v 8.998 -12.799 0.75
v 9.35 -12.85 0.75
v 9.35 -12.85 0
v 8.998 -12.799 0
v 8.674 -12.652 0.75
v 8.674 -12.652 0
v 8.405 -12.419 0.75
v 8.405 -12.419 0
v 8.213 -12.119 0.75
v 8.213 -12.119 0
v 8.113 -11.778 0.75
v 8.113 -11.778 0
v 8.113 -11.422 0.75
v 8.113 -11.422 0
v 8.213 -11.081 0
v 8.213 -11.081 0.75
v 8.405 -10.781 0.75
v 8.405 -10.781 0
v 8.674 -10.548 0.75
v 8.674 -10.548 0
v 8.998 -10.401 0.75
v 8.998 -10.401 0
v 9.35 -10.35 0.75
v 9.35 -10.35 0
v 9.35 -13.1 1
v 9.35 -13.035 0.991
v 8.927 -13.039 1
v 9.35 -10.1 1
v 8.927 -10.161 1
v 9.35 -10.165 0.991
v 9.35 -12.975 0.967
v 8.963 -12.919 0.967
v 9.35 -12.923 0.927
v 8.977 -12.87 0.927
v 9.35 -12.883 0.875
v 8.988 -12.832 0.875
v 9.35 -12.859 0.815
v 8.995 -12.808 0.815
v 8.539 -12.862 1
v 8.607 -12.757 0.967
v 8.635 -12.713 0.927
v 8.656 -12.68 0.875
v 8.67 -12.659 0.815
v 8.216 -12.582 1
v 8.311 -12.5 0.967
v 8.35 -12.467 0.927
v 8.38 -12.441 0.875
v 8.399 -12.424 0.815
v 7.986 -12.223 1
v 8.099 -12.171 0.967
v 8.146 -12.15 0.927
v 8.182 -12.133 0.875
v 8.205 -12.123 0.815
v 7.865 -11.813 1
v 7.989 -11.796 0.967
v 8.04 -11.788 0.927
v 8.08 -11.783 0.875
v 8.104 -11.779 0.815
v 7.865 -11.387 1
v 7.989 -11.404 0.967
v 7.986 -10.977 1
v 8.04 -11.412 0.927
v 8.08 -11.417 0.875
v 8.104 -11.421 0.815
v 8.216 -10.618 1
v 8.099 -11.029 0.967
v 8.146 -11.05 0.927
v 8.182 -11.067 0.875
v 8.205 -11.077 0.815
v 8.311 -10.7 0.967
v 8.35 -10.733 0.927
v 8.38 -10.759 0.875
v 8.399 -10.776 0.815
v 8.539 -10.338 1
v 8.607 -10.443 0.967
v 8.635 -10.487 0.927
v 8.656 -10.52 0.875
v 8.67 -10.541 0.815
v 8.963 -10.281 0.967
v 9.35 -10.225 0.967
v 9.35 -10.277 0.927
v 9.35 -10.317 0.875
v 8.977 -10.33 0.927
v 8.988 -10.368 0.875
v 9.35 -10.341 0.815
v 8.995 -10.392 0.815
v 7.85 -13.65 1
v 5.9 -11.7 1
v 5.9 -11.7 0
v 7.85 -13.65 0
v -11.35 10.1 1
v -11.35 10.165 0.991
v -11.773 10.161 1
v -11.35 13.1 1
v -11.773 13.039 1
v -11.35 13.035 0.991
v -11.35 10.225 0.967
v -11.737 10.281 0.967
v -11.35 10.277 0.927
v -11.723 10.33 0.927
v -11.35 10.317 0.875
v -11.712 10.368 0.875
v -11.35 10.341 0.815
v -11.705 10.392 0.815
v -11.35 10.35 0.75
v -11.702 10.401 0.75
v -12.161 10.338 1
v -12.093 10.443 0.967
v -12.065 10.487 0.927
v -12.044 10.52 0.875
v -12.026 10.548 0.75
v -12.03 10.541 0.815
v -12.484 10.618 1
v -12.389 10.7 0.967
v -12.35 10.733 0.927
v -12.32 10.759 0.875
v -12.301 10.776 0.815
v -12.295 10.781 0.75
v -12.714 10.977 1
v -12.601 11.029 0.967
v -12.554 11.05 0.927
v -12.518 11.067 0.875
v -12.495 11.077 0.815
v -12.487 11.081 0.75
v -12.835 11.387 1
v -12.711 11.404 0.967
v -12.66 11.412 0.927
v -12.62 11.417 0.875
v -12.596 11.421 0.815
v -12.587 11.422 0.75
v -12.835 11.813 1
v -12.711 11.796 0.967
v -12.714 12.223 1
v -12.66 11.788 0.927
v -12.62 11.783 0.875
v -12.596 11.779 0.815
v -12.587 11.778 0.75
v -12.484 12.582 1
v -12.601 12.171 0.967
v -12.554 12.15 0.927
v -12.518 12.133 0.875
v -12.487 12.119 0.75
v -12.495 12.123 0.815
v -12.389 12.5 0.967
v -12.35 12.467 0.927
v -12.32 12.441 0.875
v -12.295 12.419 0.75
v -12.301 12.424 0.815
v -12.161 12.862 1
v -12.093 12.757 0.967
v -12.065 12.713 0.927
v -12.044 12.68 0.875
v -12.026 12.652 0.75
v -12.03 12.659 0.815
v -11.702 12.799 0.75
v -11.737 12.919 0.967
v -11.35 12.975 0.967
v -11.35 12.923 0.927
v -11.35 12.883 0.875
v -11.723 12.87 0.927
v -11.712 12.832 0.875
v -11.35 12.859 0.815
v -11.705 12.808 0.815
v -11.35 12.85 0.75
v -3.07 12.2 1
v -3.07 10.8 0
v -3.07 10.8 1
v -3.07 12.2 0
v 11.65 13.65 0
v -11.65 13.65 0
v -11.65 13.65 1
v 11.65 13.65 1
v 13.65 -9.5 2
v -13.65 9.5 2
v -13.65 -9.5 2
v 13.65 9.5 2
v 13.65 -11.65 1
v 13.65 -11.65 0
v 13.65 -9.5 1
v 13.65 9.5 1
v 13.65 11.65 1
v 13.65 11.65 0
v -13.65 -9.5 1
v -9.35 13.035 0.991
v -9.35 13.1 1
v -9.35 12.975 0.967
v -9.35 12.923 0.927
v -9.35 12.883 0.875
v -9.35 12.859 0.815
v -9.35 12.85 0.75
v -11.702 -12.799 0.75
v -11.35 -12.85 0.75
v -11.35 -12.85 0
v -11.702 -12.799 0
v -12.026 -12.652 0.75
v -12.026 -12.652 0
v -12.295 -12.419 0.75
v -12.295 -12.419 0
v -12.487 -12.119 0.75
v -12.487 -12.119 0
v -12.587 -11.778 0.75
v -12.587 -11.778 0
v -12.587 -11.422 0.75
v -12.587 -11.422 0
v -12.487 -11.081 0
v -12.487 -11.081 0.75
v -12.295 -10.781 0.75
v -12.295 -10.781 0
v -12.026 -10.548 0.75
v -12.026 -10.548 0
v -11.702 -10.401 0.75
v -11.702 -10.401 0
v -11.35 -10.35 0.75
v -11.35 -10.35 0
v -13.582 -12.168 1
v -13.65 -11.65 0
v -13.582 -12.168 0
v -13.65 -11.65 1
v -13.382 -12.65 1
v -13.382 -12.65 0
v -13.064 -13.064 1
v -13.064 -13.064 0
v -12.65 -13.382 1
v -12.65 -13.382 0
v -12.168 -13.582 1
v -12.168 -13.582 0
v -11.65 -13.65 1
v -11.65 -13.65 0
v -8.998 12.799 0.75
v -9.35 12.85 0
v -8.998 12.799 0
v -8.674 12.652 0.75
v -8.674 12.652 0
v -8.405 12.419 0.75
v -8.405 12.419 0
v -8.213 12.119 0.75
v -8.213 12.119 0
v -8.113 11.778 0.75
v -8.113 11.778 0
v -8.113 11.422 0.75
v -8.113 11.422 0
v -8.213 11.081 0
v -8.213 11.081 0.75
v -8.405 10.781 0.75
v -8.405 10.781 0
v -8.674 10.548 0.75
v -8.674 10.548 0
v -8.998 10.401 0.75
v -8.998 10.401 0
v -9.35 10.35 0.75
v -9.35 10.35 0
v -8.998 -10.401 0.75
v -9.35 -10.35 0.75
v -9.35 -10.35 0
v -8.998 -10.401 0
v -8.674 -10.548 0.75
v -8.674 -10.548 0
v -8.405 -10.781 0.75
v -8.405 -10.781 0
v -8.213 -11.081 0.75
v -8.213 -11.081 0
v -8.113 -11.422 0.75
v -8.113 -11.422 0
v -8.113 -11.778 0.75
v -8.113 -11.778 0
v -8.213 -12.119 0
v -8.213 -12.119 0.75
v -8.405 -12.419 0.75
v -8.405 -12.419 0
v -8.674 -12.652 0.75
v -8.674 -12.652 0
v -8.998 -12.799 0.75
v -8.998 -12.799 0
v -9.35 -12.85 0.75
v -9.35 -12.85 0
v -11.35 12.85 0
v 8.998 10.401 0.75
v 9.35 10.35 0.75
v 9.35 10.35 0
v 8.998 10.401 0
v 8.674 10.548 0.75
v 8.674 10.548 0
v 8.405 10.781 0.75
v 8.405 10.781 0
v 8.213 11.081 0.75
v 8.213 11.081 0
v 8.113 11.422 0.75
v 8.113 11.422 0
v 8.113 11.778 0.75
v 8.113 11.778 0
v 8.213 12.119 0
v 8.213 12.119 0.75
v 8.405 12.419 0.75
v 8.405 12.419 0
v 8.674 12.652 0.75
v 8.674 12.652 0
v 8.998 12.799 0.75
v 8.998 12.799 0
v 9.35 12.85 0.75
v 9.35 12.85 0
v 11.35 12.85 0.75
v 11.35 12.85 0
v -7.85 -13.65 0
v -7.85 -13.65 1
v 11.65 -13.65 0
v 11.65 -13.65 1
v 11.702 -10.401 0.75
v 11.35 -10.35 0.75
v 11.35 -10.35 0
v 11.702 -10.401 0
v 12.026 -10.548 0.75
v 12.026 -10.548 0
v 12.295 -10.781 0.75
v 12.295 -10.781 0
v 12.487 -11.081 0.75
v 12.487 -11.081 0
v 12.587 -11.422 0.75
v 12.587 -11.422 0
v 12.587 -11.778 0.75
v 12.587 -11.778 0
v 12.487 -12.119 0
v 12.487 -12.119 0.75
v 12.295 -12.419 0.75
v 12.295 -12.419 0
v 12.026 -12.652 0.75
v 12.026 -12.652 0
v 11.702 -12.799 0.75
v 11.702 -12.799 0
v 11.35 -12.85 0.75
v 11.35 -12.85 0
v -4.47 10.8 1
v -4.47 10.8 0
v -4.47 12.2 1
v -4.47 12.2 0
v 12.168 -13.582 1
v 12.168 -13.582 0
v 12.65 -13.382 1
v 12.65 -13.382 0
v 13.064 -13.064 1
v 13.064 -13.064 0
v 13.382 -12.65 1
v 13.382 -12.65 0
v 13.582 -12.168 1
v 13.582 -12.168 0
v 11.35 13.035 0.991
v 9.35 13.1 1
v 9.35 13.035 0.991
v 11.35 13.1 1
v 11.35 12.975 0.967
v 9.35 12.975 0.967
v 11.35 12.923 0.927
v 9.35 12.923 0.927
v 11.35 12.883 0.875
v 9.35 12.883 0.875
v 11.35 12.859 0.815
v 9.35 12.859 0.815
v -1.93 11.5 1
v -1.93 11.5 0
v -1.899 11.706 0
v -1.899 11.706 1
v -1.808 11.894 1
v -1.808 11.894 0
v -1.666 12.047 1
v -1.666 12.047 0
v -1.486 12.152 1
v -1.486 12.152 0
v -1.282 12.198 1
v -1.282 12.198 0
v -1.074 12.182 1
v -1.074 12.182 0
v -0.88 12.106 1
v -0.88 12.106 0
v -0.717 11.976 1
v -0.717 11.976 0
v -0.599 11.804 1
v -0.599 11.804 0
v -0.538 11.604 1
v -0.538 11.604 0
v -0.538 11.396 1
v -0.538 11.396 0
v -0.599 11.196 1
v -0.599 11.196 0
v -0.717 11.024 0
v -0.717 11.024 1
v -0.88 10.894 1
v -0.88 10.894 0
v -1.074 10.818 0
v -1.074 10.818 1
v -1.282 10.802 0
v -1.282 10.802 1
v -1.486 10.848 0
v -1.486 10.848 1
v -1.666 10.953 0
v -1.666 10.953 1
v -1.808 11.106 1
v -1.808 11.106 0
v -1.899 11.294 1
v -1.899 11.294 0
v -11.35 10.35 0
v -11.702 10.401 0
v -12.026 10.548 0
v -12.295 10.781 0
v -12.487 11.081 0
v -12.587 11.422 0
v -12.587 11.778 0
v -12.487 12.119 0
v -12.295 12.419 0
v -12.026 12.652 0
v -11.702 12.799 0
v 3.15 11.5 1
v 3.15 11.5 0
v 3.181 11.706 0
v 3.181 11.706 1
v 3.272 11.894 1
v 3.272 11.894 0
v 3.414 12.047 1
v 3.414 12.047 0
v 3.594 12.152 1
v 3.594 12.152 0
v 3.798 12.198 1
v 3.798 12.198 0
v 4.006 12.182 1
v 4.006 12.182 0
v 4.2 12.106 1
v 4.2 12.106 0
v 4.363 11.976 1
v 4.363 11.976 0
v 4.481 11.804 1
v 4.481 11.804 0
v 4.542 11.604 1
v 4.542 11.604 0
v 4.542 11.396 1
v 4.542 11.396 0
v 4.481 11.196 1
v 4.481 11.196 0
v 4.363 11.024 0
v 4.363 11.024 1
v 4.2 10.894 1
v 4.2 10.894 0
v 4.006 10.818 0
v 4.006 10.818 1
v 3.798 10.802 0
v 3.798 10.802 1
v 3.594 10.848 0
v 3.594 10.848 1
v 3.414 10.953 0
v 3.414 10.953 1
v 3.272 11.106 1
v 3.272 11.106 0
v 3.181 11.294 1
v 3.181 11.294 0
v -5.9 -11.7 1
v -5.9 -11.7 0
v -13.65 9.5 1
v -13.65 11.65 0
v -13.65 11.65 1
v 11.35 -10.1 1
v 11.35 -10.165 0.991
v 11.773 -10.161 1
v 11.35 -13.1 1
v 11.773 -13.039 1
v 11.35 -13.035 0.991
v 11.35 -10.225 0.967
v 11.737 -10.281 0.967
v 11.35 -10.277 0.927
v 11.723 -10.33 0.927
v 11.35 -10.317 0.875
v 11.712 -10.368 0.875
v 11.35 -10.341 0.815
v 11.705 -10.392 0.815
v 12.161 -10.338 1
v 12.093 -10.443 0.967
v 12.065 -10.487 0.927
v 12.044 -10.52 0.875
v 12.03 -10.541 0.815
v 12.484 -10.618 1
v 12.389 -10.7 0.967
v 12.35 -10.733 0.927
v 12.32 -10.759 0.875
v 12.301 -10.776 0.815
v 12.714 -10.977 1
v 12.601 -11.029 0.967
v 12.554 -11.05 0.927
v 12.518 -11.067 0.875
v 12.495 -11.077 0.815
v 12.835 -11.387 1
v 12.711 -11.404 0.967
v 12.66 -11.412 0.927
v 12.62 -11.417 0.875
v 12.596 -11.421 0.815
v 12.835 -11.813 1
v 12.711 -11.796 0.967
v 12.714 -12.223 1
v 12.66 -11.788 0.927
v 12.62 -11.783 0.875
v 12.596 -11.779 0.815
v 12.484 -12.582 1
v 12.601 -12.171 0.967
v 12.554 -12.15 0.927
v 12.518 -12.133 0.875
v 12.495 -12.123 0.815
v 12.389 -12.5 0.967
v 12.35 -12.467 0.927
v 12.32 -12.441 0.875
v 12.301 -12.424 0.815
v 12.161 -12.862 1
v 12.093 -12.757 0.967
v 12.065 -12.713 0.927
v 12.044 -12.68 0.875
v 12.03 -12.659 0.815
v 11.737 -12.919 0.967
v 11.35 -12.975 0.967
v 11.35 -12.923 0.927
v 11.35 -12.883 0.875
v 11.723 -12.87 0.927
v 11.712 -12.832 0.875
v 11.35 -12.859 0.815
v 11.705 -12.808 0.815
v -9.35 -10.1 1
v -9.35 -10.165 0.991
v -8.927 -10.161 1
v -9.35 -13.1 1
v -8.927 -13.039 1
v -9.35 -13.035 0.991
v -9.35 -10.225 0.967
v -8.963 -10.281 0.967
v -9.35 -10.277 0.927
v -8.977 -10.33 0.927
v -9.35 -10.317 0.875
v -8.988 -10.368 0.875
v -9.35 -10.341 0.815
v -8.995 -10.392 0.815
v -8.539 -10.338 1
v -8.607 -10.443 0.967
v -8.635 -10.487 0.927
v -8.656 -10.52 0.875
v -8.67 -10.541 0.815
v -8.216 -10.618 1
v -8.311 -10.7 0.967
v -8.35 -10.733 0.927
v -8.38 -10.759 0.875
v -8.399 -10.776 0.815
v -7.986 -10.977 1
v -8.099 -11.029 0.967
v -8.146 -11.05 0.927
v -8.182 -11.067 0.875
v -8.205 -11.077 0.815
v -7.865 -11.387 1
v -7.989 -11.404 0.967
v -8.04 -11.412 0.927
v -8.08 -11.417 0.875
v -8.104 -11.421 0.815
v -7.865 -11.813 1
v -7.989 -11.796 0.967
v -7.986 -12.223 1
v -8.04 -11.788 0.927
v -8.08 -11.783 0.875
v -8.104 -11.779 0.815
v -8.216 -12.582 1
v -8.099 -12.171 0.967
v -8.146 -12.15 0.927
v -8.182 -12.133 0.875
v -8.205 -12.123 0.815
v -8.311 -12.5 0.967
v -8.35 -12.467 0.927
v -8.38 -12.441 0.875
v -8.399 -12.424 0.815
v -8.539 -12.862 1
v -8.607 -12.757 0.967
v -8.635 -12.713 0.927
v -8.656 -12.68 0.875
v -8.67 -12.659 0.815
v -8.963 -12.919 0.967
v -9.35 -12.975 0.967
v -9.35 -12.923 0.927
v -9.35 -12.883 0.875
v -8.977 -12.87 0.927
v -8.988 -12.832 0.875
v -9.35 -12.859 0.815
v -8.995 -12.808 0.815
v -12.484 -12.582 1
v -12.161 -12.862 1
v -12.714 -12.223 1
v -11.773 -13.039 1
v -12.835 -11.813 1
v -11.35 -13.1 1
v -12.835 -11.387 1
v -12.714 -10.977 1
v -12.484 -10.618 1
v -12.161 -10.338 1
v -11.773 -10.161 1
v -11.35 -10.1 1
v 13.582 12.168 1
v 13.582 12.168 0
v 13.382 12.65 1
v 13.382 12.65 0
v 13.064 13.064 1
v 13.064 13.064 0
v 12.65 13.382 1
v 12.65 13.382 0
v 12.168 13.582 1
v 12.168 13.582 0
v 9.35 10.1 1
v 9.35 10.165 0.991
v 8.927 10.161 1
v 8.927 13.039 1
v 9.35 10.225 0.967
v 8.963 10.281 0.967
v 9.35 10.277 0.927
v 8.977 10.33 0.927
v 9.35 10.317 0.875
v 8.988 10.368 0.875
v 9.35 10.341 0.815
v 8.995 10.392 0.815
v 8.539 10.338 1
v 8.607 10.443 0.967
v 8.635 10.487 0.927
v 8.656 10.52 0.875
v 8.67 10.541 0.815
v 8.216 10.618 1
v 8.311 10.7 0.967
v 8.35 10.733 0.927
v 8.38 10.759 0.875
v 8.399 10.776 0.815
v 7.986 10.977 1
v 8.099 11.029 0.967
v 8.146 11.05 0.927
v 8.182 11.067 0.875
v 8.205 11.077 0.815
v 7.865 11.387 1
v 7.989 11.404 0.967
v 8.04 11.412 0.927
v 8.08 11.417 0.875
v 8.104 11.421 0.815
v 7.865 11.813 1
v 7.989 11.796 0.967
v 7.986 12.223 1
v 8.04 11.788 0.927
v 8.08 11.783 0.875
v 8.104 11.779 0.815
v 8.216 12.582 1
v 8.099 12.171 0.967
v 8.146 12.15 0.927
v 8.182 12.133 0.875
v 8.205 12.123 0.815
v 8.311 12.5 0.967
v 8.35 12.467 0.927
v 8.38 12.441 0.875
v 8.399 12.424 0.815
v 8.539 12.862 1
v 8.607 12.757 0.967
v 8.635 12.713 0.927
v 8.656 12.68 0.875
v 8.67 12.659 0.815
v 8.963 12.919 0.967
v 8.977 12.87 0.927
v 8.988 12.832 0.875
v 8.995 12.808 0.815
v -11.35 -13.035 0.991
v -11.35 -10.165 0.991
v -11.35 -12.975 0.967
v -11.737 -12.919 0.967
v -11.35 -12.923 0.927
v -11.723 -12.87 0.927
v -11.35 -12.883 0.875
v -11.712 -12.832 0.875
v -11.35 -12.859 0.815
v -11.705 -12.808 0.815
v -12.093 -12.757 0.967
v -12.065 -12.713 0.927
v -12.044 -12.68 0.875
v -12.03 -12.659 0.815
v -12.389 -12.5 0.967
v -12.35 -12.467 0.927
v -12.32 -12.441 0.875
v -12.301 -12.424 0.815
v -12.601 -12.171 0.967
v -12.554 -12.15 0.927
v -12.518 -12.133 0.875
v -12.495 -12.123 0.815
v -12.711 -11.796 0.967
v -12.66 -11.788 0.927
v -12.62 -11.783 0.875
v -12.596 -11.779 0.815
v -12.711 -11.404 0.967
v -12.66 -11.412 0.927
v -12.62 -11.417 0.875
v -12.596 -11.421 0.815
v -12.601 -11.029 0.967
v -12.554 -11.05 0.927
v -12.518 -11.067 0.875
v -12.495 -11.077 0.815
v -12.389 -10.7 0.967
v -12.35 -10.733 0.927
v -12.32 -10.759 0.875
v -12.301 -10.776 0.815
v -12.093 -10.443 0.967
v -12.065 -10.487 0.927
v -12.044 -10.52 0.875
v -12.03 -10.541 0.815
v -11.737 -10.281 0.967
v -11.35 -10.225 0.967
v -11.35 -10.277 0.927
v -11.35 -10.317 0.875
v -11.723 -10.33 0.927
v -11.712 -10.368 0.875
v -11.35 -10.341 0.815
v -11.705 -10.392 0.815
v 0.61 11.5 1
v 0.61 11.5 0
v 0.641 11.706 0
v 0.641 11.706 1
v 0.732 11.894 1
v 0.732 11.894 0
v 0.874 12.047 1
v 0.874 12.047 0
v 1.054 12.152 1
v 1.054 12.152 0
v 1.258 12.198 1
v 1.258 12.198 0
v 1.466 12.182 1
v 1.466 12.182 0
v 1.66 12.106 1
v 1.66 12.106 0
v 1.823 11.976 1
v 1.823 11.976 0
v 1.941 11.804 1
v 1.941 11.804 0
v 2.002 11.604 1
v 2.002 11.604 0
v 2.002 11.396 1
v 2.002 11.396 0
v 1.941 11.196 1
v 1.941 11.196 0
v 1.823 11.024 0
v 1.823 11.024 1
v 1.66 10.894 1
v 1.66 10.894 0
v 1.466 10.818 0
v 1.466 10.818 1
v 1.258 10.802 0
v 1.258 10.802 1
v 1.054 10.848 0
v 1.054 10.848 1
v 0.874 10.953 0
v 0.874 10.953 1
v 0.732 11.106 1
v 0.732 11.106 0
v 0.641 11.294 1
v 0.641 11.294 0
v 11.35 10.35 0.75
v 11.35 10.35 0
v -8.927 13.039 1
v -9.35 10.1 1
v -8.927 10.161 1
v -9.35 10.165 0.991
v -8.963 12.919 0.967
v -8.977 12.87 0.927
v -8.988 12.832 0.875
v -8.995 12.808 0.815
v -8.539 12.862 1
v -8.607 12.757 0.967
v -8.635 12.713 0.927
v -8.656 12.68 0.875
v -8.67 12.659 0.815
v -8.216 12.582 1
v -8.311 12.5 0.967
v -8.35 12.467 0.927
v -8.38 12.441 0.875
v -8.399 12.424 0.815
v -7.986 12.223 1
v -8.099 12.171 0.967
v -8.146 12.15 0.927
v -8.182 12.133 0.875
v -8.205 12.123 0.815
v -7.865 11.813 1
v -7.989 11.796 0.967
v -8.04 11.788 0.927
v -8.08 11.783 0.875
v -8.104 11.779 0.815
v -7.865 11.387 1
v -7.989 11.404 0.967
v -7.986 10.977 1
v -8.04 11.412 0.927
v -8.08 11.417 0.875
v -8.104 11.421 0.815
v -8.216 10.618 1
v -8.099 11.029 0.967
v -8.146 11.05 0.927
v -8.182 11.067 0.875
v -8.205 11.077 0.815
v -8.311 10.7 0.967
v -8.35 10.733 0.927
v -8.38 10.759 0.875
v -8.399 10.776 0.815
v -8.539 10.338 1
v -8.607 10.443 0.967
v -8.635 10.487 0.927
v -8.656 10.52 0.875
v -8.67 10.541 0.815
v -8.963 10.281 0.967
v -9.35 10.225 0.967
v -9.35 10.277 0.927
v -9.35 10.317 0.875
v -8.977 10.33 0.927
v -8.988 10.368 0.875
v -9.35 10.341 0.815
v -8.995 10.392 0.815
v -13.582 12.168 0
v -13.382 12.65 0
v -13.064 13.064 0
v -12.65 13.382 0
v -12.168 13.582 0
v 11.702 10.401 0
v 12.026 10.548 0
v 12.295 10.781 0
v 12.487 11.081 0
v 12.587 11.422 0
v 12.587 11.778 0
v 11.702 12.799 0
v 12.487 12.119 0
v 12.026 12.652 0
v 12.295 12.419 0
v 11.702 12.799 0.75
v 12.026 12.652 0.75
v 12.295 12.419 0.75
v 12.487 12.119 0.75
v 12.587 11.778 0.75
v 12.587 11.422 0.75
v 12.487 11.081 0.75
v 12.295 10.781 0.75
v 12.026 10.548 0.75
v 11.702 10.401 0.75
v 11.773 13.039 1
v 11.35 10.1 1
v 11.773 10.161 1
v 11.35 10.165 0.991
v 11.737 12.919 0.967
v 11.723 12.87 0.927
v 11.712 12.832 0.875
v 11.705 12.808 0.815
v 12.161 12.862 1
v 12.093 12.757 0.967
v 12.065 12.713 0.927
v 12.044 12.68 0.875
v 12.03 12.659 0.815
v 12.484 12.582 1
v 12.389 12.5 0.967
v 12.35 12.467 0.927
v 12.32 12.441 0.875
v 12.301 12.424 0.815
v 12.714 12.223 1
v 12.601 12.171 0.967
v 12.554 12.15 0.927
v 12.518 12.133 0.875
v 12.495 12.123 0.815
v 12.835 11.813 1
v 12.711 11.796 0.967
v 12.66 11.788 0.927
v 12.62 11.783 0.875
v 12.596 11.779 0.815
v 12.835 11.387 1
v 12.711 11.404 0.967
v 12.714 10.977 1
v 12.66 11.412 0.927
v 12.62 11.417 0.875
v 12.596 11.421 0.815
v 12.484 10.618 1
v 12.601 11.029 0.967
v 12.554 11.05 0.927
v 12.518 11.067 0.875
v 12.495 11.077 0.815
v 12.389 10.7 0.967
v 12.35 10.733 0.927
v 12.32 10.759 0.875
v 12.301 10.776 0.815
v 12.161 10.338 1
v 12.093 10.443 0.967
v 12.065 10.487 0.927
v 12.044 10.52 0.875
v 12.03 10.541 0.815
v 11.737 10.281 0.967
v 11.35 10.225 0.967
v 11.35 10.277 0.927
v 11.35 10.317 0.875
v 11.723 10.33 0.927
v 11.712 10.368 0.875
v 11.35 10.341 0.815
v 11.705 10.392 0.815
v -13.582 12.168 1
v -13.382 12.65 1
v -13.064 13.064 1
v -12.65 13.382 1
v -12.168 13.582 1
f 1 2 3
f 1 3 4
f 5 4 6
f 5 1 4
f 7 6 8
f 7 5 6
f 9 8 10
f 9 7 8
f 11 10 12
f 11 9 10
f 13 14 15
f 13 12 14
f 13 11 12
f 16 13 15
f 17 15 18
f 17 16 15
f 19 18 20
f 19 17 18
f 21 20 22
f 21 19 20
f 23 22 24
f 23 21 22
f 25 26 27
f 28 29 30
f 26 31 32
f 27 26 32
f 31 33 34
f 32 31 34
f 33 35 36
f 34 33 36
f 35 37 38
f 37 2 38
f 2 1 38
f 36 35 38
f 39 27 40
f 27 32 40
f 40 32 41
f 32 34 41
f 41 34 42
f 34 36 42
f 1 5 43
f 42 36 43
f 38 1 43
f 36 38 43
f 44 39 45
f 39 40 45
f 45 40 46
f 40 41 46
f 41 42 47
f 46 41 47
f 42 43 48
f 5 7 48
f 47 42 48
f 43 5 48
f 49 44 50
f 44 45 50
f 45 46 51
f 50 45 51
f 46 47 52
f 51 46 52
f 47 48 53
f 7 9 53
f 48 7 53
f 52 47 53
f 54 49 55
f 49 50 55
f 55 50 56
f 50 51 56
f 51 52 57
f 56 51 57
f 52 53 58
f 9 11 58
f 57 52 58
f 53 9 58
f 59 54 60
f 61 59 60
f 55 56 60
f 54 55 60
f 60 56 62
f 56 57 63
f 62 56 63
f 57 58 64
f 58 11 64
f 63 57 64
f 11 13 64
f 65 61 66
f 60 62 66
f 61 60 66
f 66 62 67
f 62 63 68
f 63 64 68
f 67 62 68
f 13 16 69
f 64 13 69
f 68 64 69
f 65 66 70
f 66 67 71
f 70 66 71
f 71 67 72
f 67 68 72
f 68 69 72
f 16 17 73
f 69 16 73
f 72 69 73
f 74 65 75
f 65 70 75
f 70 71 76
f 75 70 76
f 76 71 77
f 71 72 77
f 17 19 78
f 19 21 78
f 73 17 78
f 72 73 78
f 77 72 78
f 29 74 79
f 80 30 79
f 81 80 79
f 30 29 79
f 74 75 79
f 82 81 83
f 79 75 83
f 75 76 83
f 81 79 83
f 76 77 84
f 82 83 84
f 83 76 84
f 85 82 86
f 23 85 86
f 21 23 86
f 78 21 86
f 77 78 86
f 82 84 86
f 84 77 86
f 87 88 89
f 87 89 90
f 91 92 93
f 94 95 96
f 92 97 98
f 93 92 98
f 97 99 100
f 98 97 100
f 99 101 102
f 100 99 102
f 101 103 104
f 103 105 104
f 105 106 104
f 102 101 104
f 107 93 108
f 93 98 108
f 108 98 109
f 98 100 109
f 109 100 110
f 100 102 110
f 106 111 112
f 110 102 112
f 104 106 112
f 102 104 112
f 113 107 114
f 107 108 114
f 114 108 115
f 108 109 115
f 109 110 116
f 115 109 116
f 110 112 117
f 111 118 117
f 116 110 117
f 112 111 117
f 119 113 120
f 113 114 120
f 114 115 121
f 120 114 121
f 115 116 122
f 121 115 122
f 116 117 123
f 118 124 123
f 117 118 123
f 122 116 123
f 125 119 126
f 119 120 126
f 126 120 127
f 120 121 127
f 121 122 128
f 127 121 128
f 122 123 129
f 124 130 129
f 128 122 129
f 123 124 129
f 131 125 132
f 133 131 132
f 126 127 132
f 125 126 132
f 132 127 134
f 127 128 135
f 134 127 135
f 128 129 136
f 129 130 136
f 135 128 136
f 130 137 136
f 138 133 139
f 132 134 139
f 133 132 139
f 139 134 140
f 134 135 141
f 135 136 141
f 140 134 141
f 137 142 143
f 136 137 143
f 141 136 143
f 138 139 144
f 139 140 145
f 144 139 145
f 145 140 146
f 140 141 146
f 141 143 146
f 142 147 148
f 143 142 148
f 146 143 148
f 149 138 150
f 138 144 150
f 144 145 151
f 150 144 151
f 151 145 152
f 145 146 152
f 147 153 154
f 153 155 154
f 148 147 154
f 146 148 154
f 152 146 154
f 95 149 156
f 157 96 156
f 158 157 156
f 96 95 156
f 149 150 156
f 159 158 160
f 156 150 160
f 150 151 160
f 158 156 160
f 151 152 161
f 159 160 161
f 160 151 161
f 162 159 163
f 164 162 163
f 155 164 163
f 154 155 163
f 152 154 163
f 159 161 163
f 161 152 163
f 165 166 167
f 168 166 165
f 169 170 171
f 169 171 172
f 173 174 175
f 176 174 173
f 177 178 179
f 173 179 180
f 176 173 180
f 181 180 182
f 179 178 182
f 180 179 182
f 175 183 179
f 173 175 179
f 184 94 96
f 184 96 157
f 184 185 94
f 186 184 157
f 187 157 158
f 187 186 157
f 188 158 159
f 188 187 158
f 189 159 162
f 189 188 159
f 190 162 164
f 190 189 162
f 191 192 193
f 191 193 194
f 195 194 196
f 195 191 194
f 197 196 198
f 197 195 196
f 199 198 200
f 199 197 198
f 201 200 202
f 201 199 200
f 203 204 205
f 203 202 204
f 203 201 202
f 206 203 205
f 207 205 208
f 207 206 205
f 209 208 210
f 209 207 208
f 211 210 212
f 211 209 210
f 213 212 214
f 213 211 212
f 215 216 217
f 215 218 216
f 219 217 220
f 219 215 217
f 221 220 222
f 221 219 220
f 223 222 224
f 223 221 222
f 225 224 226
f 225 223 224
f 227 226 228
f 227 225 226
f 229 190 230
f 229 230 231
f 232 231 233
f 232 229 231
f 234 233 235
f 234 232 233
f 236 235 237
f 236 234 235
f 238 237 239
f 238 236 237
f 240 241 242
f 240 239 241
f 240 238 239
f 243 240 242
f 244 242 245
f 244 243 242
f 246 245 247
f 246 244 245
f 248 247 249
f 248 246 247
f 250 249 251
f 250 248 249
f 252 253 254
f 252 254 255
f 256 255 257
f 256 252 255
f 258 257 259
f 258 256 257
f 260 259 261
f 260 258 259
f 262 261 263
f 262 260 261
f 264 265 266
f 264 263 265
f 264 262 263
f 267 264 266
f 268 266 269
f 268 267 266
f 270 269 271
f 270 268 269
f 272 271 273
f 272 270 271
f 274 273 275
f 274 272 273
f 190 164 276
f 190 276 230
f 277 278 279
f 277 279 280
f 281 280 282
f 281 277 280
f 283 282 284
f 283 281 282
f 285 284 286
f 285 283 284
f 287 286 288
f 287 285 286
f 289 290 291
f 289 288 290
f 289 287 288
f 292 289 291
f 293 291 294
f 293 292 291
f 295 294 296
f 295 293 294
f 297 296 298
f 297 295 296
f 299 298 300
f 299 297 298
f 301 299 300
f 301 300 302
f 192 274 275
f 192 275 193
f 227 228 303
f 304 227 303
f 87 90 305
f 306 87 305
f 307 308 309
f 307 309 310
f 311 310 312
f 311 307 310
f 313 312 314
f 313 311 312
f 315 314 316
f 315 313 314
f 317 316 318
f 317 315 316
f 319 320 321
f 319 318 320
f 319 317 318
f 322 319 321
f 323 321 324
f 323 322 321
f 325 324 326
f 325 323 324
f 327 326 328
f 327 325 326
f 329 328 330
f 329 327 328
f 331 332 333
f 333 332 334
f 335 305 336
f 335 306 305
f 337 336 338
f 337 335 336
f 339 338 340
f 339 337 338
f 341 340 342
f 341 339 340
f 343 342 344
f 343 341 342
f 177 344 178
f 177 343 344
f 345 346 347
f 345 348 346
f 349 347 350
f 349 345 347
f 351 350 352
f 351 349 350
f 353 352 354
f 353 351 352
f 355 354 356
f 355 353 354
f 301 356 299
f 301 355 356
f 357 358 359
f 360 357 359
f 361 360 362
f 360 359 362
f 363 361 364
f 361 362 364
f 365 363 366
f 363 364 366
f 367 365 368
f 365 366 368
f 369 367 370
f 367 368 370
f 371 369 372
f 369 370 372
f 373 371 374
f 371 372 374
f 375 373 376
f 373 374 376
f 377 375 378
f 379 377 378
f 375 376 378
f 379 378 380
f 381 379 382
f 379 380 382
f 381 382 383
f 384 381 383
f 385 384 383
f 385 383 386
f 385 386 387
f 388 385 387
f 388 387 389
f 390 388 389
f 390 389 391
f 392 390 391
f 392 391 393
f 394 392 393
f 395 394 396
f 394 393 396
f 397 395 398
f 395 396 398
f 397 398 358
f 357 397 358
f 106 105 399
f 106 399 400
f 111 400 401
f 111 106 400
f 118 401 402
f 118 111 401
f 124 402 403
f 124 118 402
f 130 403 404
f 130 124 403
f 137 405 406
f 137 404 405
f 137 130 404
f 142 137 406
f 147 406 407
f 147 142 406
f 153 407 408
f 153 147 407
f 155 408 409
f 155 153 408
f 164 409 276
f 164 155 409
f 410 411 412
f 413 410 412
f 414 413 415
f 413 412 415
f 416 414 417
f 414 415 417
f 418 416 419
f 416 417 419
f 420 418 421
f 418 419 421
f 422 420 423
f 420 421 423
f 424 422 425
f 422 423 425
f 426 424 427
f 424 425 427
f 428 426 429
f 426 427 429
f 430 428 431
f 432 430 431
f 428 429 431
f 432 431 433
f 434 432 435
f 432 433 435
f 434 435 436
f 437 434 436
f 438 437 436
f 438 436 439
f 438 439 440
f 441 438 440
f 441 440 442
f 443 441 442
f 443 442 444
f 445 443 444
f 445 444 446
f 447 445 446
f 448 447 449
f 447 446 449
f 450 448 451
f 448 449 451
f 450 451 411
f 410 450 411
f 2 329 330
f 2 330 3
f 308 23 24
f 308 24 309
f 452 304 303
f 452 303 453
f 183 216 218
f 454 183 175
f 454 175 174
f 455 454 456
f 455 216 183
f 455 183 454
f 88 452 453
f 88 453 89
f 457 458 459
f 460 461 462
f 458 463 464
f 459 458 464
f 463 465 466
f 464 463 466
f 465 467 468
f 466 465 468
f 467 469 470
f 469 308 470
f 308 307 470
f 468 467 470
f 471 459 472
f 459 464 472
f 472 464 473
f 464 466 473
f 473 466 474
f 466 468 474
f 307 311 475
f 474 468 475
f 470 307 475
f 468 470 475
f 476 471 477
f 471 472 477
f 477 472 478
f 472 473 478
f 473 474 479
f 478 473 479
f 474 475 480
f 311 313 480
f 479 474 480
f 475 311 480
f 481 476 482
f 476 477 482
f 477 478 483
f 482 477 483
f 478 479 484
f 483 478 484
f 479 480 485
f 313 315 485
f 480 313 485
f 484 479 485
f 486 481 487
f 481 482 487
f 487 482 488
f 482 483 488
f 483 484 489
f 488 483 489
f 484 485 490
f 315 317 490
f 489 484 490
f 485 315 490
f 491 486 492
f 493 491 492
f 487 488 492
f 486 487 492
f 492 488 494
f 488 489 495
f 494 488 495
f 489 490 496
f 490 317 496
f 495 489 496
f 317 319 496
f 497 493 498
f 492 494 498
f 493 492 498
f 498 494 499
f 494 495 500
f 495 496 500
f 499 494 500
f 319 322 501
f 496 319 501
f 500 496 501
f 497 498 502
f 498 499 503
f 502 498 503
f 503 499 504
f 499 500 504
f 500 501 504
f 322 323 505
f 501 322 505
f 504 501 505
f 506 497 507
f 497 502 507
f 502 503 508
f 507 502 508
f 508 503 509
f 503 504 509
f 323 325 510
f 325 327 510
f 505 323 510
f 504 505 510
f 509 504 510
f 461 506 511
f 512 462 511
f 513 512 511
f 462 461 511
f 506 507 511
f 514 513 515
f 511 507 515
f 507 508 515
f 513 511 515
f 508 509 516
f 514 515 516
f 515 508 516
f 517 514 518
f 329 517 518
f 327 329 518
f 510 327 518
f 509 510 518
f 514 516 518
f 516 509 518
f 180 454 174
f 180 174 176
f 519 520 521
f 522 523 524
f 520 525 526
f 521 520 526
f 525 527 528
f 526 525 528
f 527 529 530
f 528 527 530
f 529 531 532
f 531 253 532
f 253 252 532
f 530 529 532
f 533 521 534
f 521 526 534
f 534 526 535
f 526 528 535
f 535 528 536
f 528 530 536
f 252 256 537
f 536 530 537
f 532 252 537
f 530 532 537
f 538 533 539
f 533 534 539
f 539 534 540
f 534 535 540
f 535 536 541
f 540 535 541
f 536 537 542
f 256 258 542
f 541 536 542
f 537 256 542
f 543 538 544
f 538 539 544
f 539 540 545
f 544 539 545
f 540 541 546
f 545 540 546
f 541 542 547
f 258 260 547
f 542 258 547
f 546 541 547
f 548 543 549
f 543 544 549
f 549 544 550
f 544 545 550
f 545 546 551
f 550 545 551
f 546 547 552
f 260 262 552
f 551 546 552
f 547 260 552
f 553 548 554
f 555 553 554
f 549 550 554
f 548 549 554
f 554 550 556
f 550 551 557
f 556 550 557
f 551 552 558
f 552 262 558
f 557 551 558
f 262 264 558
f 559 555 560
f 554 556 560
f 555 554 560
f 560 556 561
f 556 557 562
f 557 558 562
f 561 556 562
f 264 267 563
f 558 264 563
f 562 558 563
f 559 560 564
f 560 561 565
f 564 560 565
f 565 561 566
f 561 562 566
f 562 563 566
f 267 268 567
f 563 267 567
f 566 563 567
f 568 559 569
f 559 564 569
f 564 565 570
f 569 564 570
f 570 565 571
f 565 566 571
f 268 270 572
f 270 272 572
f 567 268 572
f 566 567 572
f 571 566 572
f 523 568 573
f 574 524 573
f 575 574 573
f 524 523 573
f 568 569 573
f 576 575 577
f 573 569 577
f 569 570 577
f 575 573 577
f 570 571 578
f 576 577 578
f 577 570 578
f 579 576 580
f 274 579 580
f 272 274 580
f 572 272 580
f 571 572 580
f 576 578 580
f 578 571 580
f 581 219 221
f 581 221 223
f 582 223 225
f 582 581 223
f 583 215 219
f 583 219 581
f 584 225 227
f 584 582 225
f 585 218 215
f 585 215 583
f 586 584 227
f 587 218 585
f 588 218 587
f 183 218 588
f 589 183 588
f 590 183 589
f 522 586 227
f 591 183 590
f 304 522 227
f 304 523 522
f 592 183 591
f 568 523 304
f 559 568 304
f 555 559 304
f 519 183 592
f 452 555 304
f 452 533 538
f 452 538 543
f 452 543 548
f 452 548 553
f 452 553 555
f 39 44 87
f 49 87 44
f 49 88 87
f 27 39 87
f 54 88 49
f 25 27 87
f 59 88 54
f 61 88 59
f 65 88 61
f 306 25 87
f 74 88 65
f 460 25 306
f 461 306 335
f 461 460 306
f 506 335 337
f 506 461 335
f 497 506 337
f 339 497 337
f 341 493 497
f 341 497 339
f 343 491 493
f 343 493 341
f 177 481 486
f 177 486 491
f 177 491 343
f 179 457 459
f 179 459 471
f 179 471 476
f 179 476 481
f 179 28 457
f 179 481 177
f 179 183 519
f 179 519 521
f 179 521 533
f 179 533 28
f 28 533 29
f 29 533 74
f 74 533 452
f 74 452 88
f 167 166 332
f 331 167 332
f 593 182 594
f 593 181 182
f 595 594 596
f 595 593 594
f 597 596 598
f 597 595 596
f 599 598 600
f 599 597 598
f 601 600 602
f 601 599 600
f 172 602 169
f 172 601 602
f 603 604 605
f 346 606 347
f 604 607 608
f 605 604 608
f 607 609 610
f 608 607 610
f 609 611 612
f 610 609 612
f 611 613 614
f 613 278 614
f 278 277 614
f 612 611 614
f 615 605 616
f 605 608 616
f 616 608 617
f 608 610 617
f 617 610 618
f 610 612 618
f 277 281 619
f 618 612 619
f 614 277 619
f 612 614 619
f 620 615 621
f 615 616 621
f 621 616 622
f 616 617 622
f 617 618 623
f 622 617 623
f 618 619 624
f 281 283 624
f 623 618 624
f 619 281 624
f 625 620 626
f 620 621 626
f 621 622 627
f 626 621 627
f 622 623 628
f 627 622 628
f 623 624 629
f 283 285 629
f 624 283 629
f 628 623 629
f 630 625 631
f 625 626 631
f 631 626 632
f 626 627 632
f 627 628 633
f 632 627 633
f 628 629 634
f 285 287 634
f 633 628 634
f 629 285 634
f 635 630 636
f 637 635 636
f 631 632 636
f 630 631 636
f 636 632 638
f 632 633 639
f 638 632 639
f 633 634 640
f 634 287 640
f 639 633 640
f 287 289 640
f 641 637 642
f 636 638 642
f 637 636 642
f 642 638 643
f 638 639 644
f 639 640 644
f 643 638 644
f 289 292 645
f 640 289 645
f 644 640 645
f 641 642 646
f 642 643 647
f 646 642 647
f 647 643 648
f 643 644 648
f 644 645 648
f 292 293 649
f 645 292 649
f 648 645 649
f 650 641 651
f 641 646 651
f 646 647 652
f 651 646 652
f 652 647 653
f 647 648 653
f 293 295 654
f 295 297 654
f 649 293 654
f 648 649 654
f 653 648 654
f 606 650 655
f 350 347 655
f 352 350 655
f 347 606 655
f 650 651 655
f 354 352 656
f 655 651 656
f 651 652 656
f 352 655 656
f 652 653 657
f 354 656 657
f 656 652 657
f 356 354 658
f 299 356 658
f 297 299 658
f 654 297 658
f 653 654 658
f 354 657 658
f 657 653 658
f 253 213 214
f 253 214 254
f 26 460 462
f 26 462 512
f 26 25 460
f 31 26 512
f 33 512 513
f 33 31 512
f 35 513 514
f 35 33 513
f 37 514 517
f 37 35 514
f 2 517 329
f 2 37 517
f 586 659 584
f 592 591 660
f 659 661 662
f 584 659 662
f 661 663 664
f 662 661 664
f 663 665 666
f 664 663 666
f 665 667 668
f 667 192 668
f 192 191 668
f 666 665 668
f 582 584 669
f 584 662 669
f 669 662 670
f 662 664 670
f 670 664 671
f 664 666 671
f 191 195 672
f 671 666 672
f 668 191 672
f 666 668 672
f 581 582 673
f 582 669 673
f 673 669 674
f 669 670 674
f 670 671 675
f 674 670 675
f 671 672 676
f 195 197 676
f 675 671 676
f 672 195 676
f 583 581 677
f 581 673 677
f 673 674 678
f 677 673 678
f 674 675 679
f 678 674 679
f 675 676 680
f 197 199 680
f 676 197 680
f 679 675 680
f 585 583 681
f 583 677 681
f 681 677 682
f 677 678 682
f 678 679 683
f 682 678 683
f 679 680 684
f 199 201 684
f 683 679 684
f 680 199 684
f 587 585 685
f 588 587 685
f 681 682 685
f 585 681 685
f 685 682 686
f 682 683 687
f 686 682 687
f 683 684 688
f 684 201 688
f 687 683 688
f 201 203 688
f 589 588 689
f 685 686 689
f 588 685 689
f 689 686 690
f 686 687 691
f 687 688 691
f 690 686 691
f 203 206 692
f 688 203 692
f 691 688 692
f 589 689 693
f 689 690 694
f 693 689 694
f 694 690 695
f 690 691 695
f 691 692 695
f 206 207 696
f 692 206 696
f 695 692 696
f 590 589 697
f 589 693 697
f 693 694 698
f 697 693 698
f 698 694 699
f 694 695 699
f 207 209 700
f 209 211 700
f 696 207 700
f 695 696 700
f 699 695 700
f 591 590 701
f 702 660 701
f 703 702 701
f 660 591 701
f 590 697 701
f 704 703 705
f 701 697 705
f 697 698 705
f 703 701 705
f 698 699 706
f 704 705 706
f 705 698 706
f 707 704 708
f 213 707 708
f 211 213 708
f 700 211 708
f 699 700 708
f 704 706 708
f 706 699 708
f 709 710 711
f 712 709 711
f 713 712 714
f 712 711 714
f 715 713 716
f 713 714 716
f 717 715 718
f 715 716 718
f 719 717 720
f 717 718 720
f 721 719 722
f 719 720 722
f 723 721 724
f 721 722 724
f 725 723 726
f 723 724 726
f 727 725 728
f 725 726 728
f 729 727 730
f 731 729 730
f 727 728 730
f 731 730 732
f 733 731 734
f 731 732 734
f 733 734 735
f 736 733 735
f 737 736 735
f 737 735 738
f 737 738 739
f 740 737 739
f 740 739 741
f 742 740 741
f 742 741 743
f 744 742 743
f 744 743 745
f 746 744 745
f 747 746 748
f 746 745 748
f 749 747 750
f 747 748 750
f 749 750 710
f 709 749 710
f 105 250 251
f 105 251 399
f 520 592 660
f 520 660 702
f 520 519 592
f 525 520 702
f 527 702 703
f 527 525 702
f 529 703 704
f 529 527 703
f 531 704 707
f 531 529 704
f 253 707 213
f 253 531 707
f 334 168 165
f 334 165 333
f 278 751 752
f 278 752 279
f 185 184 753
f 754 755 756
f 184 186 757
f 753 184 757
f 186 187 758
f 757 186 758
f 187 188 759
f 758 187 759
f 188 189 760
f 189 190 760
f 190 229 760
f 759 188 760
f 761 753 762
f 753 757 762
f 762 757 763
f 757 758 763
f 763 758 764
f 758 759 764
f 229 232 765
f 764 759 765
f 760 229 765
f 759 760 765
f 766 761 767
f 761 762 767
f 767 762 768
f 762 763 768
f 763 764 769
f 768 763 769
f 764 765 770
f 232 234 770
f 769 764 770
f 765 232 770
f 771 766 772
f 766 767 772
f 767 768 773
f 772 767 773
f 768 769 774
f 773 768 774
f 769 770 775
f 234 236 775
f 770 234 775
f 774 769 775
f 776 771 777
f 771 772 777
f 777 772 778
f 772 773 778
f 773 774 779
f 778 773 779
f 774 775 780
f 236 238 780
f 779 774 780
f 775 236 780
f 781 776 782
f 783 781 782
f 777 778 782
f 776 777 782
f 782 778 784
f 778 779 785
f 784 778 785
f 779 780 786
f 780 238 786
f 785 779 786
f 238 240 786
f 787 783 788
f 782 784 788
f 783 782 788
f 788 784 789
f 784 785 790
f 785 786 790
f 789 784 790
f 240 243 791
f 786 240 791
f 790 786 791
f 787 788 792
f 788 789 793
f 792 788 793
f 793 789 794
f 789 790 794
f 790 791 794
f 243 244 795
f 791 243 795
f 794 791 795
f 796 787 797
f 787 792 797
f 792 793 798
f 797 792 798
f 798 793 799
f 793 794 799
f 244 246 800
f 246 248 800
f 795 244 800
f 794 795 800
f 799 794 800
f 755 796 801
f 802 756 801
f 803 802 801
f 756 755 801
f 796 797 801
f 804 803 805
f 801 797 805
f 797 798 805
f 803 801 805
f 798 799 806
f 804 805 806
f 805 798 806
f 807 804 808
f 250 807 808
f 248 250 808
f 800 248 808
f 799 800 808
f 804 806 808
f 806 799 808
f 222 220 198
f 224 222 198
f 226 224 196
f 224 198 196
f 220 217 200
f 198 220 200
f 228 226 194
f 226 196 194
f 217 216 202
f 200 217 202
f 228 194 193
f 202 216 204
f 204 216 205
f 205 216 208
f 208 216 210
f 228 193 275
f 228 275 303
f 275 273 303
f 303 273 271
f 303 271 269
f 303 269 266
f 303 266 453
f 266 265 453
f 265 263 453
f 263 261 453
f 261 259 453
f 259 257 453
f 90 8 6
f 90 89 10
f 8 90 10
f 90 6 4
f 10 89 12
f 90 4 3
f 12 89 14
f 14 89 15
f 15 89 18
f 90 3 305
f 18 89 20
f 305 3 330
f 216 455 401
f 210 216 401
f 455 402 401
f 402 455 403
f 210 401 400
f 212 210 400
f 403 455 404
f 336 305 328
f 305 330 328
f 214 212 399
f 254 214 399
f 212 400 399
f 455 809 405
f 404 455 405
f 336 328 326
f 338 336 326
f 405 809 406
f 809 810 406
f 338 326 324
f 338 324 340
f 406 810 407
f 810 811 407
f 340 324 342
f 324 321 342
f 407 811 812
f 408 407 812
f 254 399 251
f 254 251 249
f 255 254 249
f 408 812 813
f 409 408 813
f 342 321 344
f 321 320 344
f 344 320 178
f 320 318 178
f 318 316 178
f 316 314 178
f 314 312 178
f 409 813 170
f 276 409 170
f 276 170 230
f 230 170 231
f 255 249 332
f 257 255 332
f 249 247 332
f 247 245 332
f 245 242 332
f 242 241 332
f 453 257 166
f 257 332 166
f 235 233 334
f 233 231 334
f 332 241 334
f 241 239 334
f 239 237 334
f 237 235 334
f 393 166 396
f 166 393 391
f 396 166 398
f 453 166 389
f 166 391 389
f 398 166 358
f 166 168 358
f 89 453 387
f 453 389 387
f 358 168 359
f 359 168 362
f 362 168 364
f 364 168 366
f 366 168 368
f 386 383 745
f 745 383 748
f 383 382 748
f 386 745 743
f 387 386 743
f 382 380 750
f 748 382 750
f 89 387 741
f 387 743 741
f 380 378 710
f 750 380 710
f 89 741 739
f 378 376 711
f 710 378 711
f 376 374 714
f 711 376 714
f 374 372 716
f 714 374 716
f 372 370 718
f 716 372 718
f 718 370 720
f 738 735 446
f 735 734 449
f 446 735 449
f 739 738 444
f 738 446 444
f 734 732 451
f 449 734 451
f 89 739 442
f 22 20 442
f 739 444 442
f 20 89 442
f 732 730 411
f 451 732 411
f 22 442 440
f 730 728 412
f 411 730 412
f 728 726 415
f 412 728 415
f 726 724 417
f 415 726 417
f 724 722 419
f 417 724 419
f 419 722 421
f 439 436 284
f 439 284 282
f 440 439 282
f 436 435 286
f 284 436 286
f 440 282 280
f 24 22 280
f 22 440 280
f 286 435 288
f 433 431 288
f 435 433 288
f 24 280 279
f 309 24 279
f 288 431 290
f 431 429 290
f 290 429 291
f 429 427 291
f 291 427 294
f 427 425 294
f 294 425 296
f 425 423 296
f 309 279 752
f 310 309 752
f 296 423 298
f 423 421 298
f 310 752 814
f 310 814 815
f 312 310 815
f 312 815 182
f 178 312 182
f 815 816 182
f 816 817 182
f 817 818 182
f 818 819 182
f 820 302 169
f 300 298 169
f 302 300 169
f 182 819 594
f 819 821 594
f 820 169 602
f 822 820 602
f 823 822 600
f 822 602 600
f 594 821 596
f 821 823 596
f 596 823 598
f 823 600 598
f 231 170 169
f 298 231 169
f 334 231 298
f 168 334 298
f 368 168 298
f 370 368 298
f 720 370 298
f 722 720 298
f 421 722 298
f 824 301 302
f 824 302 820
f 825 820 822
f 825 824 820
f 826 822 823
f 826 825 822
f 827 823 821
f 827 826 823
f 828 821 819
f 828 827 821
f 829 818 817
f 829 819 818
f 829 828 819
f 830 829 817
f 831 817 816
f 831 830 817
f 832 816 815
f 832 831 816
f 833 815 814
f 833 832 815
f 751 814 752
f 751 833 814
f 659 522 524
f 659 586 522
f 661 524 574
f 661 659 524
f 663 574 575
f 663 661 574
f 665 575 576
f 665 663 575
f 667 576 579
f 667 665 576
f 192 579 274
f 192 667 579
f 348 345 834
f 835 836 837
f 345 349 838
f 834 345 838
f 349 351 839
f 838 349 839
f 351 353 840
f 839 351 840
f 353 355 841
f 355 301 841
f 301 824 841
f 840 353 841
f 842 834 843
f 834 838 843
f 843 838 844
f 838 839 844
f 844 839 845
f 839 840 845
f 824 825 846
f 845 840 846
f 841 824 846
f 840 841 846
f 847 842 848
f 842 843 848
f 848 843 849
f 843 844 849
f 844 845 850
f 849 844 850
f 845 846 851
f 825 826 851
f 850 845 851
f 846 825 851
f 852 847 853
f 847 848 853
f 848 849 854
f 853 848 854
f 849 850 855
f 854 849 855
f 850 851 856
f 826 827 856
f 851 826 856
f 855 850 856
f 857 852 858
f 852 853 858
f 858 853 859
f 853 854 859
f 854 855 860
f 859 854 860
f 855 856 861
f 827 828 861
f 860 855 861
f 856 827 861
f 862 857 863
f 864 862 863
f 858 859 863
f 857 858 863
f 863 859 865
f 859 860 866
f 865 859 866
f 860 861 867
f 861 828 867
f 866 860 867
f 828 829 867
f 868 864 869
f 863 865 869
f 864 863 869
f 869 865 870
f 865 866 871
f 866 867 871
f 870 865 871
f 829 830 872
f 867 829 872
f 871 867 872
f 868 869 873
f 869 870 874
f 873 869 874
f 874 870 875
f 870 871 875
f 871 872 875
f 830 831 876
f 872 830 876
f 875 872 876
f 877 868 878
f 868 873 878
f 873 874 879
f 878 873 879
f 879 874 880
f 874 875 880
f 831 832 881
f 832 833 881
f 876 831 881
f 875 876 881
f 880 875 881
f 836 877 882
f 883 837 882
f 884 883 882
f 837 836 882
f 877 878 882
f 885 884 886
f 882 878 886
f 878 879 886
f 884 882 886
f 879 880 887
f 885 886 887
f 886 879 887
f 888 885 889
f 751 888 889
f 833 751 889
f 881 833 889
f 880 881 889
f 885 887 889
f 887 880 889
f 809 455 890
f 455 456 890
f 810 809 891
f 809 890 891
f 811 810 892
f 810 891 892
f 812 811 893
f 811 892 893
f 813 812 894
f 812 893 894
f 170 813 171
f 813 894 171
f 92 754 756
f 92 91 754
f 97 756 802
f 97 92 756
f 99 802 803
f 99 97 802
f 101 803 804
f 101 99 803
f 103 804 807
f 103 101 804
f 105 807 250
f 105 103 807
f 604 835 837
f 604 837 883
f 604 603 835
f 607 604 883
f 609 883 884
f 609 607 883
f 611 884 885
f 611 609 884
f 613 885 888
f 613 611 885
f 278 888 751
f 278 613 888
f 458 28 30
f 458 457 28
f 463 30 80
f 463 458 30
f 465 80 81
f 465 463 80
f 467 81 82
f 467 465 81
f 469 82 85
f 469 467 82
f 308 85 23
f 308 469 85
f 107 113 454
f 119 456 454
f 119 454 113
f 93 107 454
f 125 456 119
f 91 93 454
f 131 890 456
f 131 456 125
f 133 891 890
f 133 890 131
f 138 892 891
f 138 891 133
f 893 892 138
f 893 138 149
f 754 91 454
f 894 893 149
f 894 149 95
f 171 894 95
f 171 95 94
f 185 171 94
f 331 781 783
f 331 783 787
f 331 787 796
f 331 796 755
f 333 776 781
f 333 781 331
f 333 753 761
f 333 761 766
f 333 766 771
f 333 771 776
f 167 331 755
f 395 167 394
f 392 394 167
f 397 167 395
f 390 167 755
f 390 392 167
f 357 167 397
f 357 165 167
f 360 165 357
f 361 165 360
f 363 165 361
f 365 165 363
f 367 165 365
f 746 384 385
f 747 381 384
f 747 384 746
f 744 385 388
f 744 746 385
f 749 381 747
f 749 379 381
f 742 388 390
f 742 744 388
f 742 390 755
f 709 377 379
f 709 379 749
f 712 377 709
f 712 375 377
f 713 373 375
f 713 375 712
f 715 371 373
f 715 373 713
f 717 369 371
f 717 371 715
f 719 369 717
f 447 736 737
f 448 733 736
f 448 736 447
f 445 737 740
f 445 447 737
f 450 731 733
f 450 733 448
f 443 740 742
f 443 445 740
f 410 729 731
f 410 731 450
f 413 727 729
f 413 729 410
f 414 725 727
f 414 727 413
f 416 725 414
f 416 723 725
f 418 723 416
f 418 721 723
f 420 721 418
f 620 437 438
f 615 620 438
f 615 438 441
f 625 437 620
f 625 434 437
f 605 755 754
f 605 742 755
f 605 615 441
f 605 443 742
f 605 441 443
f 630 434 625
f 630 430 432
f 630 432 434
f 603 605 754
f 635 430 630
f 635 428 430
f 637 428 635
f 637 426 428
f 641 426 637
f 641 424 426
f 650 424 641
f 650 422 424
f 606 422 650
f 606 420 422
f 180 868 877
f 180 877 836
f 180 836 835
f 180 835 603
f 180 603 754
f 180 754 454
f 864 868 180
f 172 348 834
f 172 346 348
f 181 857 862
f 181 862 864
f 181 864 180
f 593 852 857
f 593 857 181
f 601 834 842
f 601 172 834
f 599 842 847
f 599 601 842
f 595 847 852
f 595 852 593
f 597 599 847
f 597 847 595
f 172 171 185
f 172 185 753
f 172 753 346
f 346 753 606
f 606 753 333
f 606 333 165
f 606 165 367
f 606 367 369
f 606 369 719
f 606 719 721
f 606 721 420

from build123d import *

# Parameters (mm, degrees)
SKETCH1_W           = 27.3
SKETCH1_H           = 27.3
BOSS_EXTRUDE1_DEPTH = 1
FILLET1_R           = 2
CUT_EXTRUDE1_DEPTH  = 2
SKETCH5_W           = 27.3
SKETCH5_H           = 19
BOSS_EXTRUDE2_DEPTH = 1
CUT_EXTRUDE2_DEPTH  = 2
FILLET2_R           = 0.25
SKETCH7_R           = 0.7
SKETCH7_W           = 1.4
SKETCH7_H           = 1.4
CUT_EXTRUDE3_DEPTH  = 1


with BuildPart() as part:
    # Sketch1 → Boss-Extrude1 (new body)
    with BuildSketch(Plane.XY):
        Rectangle(SKETCH1_W, SKETCH1_H)
    extrude(amount=BOSS_EXTRUDE1_DEPTH)

    # Fillet1
    fillet1_edges = [part.edges().sort_by_distance(p)[0] for p in [
        (13.65, -13.65, 0.5),
        (-13.65, -13.65, 0.5),
        (-13.65, 13.65, 0.5),
        (13.65, 13.65, 0.5),
    ]]
    fillet(fillet1_edges, radius=FILLET1_R)

    # Sketch2 → Cut-Extrude1 (cut)
    with BuildSketch(Plane.XY.offset(1)):
        with BuildLine():
            Line((-11.35, 12.85), (-9.35, 12.85))
            ThreePointArc((-9.35, 12.85), (-8.1, 11.6), (-9.35, 10.35))
            Line((-9.35, 10.35), (-11.35, 10.35))
            ThreePointArc((-11.35, 10.35), (-12.6, 11.6), (-11.35, 12.85))
        make_face()
        with BuildLine():
            Line((11.35, 10.35), (9.35, 10.35))
            ThreePointArc((9.35, 10.35), (8.1, 11.6), (9.35, 12.85))
            Line((9.35, 12.85), (11.35, 12.85))
            ThreePointArc((11.35, 12.85), (12.6, 11.6), (11.35, 10.35))
        make_face()
        with BuildLine():
            Line((-11.35, -10.35), (-9.35, -10.35))
            ThreePointArc((-9.35, -10.35), (-8.1, -11.6), (-9.35, -12.85))
            Line((-9.35, -12.85), (-11.35, -12.85))
            ThreePointArc((-11.35, -12.85), (-12.6, -11.6), (-11.35, -10.35))
        make_face()
        with BuildLine():
            Line((11.35, -12.85), (9.35, -12.85))
            ThreePointArc((9.35, -12.85), (8.1, -11.6), (9.35, -10.35))
            Line((9.35, -10.35), (11.35, -10.35))
            ThreePointArc((11.35, -10.35), (12.6, -11.6), (11.35, -12.85))
        make_face()
    extrude(amount=-CUT_EXTRUDE1_DEPTH, mode=Mode.SUBTRACT)

    # Sketch5 → Boss-Extrude2 (add)
    with BuildSketch(Plane.XY.offset(1)):
        Rectangle(SKETCH5_W, SKETCH5_H)
    extrude(amount=BOSS_EXTRUDE2_DEPTH)

    # Sketch3 → Cut-Extrude2 (cut)
    with BuildSketch(Plane.XY.offset(1)):
        Polygon((-7.85, -13.65), (-5.9, -11.7), (5.9, -11.7), (7.85, -13.65), align=None)
    extrude(amount=-CUT_EXTRUDE2_DEPTH, mode=Mode.SUBTRACT)

    # Fillet2
    fillet2_edges = [part.edges().sort_by_distance(p)[0] for p in [
        (12.6, 11.6, 1),
        (10.35, 12.85, 1),
        (8.1, 11.6, 1),
        (10.35, 10.35, 1),
        (-12.6, -11.6, 1),
        (-10.35, -12.85, 1),
        (-8.1, -11.6, 1),
        (-10.35, -10.35, 1),
        (12.6, -11.6, 1),
        (10.35, -10.35, 1),
        (8.1, -11.6, 1),
        (10.35, -12.85, 1),
        (-12.6, 11.6, 1),
        (-10.35, 10.35, 1),
        (-8.1, 11.6, 1),
        (-10.35, 12.85, 1),
    ]]
    fillet(fillet2_edges, radius=FILLET2_R)

    # Sketch7 → Cut-Extrude3 (cut)
    with BuildSketch(Plane(origin=(0, 0, 0), x_dir=(-1, 0, 0), z_dir=(0, 0, -1))):
        with Locations((-3.85, 11.5)):
            Circle(SKETCH7_R)
        with Locations((-1.31, 11.5)):
            Circle(SKETCH7_R)
        with Locations((1.23, 11.5)):
            Circle(SKETCH7_R)
        with Locations((3.77, 11.5)):
            Rectangle(SKETCH7_W, SKETCH7_H)
    extrude(amount=-CUT_EXTRUDE3_DEPTH, mode=Mode.SUBTRACT)


solid = part.part
